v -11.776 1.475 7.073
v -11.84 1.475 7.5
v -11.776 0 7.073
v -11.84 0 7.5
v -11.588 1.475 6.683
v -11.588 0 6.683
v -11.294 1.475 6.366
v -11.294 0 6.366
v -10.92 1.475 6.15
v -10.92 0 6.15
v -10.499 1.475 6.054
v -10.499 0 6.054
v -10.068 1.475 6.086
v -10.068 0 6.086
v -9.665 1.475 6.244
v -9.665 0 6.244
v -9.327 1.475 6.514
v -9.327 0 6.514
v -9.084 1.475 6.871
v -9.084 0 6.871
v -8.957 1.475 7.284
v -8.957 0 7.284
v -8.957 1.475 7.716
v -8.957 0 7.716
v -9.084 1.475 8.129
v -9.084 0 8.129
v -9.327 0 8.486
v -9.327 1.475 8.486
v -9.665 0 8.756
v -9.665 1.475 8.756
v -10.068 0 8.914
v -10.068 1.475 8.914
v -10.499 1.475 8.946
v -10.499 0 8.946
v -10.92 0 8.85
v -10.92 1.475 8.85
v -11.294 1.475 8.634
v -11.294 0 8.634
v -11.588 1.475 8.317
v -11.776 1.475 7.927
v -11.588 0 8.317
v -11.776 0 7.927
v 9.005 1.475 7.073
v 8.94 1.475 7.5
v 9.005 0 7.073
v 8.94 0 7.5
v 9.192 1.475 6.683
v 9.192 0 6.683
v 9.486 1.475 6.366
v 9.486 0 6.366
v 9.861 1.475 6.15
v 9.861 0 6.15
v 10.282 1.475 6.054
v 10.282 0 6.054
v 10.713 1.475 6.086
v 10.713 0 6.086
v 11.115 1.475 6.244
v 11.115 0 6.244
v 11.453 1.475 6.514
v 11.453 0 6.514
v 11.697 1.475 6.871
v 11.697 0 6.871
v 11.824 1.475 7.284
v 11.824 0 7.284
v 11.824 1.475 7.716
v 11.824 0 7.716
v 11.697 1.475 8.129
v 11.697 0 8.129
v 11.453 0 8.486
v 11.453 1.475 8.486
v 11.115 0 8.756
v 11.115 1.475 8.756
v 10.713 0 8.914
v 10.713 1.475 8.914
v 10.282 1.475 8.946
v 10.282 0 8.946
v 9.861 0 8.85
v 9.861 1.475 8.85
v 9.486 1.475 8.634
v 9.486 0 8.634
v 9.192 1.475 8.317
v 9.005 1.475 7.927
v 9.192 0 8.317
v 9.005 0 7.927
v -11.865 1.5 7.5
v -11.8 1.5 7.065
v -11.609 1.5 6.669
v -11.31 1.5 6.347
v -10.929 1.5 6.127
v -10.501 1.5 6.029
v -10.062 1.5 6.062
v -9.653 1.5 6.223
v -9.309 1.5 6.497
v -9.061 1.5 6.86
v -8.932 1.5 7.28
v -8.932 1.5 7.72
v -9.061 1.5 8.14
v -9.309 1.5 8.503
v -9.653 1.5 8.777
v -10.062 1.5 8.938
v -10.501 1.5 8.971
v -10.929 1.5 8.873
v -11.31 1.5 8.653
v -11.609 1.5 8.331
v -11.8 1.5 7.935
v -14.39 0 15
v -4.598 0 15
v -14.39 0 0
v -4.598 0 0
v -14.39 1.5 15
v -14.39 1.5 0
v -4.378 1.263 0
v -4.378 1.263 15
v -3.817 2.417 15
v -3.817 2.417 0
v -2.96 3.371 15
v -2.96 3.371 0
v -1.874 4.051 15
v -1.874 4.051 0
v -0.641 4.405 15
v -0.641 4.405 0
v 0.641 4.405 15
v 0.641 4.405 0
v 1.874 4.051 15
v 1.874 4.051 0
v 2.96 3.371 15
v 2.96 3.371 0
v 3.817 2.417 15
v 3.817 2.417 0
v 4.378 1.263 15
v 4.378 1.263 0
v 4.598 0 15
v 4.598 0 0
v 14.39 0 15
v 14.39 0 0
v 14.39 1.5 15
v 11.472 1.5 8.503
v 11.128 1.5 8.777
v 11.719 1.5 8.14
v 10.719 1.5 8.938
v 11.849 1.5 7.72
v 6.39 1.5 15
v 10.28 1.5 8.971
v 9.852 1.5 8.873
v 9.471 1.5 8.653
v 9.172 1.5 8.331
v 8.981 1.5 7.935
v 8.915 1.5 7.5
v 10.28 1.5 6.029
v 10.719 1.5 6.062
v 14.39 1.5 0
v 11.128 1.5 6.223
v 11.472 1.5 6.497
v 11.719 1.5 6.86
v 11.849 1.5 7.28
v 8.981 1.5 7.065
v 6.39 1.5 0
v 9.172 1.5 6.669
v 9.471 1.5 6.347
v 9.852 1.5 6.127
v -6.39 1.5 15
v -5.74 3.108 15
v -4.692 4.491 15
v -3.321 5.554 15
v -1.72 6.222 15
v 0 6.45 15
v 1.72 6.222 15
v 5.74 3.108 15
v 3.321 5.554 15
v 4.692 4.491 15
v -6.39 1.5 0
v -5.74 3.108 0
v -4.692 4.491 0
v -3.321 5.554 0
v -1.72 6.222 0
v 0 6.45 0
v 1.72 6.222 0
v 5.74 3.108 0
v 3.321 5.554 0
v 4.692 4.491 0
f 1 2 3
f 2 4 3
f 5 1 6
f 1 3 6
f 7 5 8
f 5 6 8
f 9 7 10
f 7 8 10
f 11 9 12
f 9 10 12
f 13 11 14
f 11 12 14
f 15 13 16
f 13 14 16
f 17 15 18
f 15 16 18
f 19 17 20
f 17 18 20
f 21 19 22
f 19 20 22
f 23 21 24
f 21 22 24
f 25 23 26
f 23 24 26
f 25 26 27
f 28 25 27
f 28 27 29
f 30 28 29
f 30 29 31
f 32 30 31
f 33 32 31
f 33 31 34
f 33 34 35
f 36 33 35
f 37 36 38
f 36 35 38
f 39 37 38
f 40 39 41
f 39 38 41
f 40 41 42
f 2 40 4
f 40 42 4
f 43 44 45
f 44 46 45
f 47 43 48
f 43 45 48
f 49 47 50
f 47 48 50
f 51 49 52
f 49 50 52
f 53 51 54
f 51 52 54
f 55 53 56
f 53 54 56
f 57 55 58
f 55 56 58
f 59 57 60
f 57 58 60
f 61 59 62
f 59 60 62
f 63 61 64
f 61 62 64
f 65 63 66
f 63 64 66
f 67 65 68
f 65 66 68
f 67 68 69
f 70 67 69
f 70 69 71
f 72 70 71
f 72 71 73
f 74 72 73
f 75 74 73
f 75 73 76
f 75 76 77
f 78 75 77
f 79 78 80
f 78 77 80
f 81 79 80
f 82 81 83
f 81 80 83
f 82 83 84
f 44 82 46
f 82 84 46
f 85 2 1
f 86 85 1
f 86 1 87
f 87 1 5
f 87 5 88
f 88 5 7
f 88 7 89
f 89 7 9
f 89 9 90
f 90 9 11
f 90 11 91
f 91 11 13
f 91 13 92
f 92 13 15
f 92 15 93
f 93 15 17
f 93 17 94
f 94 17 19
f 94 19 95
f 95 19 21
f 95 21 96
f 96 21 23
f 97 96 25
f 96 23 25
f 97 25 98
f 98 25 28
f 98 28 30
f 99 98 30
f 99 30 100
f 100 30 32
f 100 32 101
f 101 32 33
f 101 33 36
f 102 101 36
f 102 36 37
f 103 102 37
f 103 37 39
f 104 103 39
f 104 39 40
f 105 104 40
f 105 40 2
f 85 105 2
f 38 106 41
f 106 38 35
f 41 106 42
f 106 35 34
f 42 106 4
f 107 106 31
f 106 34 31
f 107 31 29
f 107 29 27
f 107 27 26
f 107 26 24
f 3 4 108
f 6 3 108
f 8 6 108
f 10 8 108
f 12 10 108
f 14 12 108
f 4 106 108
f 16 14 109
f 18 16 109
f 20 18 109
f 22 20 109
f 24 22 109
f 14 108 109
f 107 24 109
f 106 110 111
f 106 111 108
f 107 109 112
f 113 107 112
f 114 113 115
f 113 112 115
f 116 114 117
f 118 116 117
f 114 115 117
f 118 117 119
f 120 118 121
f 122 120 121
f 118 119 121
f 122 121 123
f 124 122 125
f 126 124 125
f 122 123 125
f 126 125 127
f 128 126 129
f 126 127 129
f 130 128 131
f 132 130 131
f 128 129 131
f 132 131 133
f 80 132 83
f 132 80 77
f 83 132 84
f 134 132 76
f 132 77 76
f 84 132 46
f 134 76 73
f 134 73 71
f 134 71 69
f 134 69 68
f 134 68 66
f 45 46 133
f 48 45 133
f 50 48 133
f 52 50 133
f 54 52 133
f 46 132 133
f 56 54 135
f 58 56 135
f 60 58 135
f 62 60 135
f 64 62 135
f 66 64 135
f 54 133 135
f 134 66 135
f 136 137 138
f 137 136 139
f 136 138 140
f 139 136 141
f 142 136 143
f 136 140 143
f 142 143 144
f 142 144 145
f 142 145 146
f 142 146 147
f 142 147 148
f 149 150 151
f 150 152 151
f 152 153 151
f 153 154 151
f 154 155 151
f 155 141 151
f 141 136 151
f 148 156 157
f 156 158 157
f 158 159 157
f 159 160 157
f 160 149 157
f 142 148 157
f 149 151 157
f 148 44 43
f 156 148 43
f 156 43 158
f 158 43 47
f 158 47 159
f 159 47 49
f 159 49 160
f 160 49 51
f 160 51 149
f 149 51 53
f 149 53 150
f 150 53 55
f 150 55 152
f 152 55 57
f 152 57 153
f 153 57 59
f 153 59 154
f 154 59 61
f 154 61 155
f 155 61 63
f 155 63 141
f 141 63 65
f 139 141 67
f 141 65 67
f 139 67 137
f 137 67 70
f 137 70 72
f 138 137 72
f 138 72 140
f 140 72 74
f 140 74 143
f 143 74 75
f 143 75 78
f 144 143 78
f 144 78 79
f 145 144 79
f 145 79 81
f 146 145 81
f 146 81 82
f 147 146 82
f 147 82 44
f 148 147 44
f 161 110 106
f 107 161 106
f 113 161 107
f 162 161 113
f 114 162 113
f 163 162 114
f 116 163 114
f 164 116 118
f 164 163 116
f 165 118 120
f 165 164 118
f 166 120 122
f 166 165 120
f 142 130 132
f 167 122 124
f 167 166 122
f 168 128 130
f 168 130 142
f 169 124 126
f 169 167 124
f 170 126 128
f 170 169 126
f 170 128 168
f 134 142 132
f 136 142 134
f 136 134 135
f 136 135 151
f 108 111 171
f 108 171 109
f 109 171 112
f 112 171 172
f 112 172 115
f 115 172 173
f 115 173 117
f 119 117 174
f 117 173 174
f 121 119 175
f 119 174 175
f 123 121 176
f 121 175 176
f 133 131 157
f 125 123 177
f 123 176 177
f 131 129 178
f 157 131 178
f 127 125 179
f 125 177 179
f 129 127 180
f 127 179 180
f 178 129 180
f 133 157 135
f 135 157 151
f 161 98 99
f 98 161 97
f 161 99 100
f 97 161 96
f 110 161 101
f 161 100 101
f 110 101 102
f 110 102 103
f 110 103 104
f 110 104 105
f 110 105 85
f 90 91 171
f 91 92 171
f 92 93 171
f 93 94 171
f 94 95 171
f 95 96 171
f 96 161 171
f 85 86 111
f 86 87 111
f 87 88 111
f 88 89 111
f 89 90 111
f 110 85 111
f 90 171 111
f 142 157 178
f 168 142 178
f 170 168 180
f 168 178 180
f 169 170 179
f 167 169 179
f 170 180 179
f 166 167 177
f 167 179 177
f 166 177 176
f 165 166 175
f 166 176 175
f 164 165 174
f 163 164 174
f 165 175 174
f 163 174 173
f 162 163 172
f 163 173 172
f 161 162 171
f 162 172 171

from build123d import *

# Parameters (mm, degrees)
BOSS_EXTRUDE1_DEPTH              = 15
M2_5_CLEARANCE_HOLE1_D           = 2.9
M2_5_CLEARANCE_HOLE1_CSINK_D     = 2.95
M2_5_CLEARANCE_HOLE1_CSINK_ANGLE = 90


with BuildPart() as part:
    # Sketch1 → Boss-Extrude1 (new body)
    with BuildSketch(Plane.XY):
        with BuildLine():
            Line((-14.390422521, 0), (-4.597553697, 0))
            ThreePointArc((-4.597553697, 0), (0, 4.45), (4.597553697, 0))
            Line((4.597553697, 0), (14.390422521, 0))
            Line((14.390422521, 0), (14.390422521, 1.5))
            Line((14.390422521, 1.5), (6.390422521, 1.5))
            ThreePointArc((6.390422521, 1.5), (0, 6.45), (-6.390422521, 1.5))
            Line((-6.390422521, 1.5), (-14.390422521, 1.5))
            Line((-14.390422521, 1.5), (-14.390422521, 0))
        make_face()
    extrude(amount=BOSS_EXTRUDE1_DEPTH)

    # M2.5 Clearance Hole1 (through all)
    with Locations(Plane(origin=(0, 1.5, 0), x_dir=(1, 0, 0), z_dir=(0, 1, 0))):
        with Locations((-10.390422521, -7.5), (10.390422521, -7.5)):
            CounterSinkHole(M2_5_CLEARANCE_HOLE1_D / 2, M2_5_CLEARANCE_HOLE1_CSINK_D / 2, counter_sink_angle=M2_5_CLEARANCE_HOLE1_CSINK_ANGLE)


solid = part.part
